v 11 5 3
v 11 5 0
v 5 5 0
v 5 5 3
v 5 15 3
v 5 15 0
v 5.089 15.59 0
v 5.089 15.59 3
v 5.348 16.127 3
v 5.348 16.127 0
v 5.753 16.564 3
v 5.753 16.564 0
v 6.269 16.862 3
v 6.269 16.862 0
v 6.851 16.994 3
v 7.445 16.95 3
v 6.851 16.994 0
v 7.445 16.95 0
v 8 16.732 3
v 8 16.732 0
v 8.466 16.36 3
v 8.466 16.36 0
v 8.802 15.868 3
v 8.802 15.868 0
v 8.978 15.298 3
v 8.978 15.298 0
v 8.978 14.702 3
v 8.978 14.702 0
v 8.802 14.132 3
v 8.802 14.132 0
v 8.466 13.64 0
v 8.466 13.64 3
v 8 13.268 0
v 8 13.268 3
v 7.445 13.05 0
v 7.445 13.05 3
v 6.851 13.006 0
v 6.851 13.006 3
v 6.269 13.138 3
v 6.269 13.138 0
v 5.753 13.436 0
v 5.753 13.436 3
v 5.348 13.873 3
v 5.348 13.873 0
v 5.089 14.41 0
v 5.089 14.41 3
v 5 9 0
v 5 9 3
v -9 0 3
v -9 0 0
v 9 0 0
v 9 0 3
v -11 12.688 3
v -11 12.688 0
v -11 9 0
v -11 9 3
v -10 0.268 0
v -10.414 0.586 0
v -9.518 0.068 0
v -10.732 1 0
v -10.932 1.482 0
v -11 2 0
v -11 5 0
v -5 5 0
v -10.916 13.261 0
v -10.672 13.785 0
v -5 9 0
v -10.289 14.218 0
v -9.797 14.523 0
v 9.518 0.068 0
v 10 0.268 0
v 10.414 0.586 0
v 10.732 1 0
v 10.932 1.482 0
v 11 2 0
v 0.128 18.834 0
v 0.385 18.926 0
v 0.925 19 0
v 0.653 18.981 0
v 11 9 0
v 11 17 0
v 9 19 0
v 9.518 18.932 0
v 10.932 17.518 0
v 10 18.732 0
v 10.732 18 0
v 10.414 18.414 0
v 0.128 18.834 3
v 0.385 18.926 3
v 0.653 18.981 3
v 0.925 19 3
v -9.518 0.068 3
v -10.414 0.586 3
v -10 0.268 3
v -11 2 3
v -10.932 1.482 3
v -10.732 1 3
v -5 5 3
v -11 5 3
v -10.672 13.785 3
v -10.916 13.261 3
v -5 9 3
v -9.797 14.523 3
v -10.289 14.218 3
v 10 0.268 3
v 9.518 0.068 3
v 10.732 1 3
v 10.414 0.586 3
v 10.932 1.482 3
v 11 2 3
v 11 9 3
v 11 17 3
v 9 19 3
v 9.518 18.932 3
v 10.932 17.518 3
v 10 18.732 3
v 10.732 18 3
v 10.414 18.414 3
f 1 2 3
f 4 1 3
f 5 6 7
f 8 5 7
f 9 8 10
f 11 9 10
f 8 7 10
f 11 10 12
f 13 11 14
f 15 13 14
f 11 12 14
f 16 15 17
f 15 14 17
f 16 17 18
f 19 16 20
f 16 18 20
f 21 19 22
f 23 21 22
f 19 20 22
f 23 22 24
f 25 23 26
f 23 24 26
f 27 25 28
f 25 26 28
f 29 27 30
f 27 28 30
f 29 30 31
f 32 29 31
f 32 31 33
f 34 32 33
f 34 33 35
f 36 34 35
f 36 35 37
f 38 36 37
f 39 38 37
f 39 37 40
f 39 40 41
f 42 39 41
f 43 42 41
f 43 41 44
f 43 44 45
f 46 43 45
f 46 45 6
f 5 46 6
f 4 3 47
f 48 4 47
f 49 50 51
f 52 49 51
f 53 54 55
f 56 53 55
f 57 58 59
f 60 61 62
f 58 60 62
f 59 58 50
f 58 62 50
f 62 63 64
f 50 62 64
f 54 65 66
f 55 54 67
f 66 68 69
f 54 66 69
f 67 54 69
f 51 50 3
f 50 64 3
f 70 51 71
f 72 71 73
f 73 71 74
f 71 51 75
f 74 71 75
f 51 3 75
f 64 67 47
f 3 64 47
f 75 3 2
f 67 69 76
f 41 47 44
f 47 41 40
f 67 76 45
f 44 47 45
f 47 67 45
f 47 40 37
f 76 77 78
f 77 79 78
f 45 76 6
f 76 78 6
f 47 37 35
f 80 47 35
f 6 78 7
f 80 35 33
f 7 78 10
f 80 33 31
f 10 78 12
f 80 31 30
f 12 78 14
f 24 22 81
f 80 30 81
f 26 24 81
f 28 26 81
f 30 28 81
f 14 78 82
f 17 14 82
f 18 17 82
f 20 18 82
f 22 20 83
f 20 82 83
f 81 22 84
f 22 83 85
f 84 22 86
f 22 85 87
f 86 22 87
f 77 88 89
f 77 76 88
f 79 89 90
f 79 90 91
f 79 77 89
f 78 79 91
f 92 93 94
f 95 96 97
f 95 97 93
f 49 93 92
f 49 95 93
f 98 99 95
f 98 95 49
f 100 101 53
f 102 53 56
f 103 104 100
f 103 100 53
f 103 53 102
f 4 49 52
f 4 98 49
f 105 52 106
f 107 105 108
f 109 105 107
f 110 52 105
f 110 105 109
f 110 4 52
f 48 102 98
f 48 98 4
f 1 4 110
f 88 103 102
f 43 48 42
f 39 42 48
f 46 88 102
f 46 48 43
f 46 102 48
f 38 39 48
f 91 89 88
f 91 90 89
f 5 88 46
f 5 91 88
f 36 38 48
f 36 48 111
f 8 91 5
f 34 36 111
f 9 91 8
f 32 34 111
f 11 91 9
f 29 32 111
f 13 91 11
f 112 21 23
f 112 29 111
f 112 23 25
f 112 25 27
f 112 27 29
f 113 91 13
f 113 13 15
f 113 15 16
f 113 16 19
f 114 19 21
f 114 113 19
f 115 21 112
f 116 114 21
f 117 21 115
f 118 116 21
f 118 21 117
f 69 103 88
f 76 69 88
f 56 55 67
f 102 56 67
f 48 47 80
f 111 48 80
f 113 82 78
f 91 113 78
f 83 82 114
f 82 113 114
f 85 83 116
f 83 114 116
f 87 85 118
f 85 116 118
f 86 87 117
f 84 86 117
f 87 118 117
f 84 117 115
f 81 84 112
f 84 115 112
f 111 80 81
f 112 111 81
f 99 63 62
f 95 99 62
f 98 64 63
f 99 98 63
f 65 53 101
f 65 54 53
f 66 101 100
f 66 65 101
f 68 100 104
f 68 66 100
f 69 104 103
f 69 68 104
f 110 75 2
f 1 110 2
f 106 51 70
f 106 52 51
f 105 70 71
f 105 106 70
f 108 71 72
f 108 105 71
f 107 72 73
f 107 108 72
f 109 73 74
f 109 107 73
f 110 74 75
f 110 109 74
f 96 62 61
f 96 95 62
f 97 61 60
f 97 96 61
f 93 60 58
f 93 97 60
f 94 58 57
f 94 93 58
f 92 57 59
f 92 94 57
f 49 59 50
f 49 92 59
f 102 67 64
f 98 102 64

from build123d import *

# Parameters (mm, degrees)
AUFSATZ_LINEAR_AUSTRAGEN1_DEPTH = 3
F_4_0_4_DURCHMESSER_BOHRUNG1_D  = 4
SCHNITT_LINEAR_AUSTRAGEN1_DEPTH = 3
VERRUNDUNG2_R                   = 2


with BuildPart() as part:
    # Skizze1 → Aufsatz-Linear austragen1 (new body)
    with BuildSketch(Plane.XY):
        Polygon((-11, 5), (-11, 0), (11, 0), (11, 5), (5, 5), (5, 9), (11, 9), (11, 19), (-11, 19), (-11, 9), (-5, 9), (-5, 5), align=None)
    extrude(amount=AUFSATZ_LINEAR_AUSTRAGEN1_DEPTH)

    # Ø4.0 (4) Durchmesser Bohrung1 (through all)
    with Locations(Plane.XY.offset(3)):
        with Locations((7, 15)):
            Hole(F_4_0_4_DURCHMESSER_BOHRUNG1_D / 2)

    # Skizze4 → Schnitt-Linear austragen1 (cut)
    with BuildSketch(Plane.XY.offset(3)):
        Polygon((-11, 14), (0.509428342, 19), (-11, 19), align=None)
    extrude(amount=-SCHNITT_LINEAR_AUSTRAGEN1_DEPTH, mode=Mode.SUBTRACT)

    # Verrundung2
    verrundung2_edges = [part.edges().sort_by_distance(p)[0] for p in [
        (11, 19, 1.5),
        (11, 0, 1.5),
        (-11, 0, 1.5),
        (-11, 14, 1.5),
        (0.509428342, 19, 1.5),
    ]]
    fillet(verrundung2_edges, radius=VERRUNDUNG2_R)


solid = part.part
